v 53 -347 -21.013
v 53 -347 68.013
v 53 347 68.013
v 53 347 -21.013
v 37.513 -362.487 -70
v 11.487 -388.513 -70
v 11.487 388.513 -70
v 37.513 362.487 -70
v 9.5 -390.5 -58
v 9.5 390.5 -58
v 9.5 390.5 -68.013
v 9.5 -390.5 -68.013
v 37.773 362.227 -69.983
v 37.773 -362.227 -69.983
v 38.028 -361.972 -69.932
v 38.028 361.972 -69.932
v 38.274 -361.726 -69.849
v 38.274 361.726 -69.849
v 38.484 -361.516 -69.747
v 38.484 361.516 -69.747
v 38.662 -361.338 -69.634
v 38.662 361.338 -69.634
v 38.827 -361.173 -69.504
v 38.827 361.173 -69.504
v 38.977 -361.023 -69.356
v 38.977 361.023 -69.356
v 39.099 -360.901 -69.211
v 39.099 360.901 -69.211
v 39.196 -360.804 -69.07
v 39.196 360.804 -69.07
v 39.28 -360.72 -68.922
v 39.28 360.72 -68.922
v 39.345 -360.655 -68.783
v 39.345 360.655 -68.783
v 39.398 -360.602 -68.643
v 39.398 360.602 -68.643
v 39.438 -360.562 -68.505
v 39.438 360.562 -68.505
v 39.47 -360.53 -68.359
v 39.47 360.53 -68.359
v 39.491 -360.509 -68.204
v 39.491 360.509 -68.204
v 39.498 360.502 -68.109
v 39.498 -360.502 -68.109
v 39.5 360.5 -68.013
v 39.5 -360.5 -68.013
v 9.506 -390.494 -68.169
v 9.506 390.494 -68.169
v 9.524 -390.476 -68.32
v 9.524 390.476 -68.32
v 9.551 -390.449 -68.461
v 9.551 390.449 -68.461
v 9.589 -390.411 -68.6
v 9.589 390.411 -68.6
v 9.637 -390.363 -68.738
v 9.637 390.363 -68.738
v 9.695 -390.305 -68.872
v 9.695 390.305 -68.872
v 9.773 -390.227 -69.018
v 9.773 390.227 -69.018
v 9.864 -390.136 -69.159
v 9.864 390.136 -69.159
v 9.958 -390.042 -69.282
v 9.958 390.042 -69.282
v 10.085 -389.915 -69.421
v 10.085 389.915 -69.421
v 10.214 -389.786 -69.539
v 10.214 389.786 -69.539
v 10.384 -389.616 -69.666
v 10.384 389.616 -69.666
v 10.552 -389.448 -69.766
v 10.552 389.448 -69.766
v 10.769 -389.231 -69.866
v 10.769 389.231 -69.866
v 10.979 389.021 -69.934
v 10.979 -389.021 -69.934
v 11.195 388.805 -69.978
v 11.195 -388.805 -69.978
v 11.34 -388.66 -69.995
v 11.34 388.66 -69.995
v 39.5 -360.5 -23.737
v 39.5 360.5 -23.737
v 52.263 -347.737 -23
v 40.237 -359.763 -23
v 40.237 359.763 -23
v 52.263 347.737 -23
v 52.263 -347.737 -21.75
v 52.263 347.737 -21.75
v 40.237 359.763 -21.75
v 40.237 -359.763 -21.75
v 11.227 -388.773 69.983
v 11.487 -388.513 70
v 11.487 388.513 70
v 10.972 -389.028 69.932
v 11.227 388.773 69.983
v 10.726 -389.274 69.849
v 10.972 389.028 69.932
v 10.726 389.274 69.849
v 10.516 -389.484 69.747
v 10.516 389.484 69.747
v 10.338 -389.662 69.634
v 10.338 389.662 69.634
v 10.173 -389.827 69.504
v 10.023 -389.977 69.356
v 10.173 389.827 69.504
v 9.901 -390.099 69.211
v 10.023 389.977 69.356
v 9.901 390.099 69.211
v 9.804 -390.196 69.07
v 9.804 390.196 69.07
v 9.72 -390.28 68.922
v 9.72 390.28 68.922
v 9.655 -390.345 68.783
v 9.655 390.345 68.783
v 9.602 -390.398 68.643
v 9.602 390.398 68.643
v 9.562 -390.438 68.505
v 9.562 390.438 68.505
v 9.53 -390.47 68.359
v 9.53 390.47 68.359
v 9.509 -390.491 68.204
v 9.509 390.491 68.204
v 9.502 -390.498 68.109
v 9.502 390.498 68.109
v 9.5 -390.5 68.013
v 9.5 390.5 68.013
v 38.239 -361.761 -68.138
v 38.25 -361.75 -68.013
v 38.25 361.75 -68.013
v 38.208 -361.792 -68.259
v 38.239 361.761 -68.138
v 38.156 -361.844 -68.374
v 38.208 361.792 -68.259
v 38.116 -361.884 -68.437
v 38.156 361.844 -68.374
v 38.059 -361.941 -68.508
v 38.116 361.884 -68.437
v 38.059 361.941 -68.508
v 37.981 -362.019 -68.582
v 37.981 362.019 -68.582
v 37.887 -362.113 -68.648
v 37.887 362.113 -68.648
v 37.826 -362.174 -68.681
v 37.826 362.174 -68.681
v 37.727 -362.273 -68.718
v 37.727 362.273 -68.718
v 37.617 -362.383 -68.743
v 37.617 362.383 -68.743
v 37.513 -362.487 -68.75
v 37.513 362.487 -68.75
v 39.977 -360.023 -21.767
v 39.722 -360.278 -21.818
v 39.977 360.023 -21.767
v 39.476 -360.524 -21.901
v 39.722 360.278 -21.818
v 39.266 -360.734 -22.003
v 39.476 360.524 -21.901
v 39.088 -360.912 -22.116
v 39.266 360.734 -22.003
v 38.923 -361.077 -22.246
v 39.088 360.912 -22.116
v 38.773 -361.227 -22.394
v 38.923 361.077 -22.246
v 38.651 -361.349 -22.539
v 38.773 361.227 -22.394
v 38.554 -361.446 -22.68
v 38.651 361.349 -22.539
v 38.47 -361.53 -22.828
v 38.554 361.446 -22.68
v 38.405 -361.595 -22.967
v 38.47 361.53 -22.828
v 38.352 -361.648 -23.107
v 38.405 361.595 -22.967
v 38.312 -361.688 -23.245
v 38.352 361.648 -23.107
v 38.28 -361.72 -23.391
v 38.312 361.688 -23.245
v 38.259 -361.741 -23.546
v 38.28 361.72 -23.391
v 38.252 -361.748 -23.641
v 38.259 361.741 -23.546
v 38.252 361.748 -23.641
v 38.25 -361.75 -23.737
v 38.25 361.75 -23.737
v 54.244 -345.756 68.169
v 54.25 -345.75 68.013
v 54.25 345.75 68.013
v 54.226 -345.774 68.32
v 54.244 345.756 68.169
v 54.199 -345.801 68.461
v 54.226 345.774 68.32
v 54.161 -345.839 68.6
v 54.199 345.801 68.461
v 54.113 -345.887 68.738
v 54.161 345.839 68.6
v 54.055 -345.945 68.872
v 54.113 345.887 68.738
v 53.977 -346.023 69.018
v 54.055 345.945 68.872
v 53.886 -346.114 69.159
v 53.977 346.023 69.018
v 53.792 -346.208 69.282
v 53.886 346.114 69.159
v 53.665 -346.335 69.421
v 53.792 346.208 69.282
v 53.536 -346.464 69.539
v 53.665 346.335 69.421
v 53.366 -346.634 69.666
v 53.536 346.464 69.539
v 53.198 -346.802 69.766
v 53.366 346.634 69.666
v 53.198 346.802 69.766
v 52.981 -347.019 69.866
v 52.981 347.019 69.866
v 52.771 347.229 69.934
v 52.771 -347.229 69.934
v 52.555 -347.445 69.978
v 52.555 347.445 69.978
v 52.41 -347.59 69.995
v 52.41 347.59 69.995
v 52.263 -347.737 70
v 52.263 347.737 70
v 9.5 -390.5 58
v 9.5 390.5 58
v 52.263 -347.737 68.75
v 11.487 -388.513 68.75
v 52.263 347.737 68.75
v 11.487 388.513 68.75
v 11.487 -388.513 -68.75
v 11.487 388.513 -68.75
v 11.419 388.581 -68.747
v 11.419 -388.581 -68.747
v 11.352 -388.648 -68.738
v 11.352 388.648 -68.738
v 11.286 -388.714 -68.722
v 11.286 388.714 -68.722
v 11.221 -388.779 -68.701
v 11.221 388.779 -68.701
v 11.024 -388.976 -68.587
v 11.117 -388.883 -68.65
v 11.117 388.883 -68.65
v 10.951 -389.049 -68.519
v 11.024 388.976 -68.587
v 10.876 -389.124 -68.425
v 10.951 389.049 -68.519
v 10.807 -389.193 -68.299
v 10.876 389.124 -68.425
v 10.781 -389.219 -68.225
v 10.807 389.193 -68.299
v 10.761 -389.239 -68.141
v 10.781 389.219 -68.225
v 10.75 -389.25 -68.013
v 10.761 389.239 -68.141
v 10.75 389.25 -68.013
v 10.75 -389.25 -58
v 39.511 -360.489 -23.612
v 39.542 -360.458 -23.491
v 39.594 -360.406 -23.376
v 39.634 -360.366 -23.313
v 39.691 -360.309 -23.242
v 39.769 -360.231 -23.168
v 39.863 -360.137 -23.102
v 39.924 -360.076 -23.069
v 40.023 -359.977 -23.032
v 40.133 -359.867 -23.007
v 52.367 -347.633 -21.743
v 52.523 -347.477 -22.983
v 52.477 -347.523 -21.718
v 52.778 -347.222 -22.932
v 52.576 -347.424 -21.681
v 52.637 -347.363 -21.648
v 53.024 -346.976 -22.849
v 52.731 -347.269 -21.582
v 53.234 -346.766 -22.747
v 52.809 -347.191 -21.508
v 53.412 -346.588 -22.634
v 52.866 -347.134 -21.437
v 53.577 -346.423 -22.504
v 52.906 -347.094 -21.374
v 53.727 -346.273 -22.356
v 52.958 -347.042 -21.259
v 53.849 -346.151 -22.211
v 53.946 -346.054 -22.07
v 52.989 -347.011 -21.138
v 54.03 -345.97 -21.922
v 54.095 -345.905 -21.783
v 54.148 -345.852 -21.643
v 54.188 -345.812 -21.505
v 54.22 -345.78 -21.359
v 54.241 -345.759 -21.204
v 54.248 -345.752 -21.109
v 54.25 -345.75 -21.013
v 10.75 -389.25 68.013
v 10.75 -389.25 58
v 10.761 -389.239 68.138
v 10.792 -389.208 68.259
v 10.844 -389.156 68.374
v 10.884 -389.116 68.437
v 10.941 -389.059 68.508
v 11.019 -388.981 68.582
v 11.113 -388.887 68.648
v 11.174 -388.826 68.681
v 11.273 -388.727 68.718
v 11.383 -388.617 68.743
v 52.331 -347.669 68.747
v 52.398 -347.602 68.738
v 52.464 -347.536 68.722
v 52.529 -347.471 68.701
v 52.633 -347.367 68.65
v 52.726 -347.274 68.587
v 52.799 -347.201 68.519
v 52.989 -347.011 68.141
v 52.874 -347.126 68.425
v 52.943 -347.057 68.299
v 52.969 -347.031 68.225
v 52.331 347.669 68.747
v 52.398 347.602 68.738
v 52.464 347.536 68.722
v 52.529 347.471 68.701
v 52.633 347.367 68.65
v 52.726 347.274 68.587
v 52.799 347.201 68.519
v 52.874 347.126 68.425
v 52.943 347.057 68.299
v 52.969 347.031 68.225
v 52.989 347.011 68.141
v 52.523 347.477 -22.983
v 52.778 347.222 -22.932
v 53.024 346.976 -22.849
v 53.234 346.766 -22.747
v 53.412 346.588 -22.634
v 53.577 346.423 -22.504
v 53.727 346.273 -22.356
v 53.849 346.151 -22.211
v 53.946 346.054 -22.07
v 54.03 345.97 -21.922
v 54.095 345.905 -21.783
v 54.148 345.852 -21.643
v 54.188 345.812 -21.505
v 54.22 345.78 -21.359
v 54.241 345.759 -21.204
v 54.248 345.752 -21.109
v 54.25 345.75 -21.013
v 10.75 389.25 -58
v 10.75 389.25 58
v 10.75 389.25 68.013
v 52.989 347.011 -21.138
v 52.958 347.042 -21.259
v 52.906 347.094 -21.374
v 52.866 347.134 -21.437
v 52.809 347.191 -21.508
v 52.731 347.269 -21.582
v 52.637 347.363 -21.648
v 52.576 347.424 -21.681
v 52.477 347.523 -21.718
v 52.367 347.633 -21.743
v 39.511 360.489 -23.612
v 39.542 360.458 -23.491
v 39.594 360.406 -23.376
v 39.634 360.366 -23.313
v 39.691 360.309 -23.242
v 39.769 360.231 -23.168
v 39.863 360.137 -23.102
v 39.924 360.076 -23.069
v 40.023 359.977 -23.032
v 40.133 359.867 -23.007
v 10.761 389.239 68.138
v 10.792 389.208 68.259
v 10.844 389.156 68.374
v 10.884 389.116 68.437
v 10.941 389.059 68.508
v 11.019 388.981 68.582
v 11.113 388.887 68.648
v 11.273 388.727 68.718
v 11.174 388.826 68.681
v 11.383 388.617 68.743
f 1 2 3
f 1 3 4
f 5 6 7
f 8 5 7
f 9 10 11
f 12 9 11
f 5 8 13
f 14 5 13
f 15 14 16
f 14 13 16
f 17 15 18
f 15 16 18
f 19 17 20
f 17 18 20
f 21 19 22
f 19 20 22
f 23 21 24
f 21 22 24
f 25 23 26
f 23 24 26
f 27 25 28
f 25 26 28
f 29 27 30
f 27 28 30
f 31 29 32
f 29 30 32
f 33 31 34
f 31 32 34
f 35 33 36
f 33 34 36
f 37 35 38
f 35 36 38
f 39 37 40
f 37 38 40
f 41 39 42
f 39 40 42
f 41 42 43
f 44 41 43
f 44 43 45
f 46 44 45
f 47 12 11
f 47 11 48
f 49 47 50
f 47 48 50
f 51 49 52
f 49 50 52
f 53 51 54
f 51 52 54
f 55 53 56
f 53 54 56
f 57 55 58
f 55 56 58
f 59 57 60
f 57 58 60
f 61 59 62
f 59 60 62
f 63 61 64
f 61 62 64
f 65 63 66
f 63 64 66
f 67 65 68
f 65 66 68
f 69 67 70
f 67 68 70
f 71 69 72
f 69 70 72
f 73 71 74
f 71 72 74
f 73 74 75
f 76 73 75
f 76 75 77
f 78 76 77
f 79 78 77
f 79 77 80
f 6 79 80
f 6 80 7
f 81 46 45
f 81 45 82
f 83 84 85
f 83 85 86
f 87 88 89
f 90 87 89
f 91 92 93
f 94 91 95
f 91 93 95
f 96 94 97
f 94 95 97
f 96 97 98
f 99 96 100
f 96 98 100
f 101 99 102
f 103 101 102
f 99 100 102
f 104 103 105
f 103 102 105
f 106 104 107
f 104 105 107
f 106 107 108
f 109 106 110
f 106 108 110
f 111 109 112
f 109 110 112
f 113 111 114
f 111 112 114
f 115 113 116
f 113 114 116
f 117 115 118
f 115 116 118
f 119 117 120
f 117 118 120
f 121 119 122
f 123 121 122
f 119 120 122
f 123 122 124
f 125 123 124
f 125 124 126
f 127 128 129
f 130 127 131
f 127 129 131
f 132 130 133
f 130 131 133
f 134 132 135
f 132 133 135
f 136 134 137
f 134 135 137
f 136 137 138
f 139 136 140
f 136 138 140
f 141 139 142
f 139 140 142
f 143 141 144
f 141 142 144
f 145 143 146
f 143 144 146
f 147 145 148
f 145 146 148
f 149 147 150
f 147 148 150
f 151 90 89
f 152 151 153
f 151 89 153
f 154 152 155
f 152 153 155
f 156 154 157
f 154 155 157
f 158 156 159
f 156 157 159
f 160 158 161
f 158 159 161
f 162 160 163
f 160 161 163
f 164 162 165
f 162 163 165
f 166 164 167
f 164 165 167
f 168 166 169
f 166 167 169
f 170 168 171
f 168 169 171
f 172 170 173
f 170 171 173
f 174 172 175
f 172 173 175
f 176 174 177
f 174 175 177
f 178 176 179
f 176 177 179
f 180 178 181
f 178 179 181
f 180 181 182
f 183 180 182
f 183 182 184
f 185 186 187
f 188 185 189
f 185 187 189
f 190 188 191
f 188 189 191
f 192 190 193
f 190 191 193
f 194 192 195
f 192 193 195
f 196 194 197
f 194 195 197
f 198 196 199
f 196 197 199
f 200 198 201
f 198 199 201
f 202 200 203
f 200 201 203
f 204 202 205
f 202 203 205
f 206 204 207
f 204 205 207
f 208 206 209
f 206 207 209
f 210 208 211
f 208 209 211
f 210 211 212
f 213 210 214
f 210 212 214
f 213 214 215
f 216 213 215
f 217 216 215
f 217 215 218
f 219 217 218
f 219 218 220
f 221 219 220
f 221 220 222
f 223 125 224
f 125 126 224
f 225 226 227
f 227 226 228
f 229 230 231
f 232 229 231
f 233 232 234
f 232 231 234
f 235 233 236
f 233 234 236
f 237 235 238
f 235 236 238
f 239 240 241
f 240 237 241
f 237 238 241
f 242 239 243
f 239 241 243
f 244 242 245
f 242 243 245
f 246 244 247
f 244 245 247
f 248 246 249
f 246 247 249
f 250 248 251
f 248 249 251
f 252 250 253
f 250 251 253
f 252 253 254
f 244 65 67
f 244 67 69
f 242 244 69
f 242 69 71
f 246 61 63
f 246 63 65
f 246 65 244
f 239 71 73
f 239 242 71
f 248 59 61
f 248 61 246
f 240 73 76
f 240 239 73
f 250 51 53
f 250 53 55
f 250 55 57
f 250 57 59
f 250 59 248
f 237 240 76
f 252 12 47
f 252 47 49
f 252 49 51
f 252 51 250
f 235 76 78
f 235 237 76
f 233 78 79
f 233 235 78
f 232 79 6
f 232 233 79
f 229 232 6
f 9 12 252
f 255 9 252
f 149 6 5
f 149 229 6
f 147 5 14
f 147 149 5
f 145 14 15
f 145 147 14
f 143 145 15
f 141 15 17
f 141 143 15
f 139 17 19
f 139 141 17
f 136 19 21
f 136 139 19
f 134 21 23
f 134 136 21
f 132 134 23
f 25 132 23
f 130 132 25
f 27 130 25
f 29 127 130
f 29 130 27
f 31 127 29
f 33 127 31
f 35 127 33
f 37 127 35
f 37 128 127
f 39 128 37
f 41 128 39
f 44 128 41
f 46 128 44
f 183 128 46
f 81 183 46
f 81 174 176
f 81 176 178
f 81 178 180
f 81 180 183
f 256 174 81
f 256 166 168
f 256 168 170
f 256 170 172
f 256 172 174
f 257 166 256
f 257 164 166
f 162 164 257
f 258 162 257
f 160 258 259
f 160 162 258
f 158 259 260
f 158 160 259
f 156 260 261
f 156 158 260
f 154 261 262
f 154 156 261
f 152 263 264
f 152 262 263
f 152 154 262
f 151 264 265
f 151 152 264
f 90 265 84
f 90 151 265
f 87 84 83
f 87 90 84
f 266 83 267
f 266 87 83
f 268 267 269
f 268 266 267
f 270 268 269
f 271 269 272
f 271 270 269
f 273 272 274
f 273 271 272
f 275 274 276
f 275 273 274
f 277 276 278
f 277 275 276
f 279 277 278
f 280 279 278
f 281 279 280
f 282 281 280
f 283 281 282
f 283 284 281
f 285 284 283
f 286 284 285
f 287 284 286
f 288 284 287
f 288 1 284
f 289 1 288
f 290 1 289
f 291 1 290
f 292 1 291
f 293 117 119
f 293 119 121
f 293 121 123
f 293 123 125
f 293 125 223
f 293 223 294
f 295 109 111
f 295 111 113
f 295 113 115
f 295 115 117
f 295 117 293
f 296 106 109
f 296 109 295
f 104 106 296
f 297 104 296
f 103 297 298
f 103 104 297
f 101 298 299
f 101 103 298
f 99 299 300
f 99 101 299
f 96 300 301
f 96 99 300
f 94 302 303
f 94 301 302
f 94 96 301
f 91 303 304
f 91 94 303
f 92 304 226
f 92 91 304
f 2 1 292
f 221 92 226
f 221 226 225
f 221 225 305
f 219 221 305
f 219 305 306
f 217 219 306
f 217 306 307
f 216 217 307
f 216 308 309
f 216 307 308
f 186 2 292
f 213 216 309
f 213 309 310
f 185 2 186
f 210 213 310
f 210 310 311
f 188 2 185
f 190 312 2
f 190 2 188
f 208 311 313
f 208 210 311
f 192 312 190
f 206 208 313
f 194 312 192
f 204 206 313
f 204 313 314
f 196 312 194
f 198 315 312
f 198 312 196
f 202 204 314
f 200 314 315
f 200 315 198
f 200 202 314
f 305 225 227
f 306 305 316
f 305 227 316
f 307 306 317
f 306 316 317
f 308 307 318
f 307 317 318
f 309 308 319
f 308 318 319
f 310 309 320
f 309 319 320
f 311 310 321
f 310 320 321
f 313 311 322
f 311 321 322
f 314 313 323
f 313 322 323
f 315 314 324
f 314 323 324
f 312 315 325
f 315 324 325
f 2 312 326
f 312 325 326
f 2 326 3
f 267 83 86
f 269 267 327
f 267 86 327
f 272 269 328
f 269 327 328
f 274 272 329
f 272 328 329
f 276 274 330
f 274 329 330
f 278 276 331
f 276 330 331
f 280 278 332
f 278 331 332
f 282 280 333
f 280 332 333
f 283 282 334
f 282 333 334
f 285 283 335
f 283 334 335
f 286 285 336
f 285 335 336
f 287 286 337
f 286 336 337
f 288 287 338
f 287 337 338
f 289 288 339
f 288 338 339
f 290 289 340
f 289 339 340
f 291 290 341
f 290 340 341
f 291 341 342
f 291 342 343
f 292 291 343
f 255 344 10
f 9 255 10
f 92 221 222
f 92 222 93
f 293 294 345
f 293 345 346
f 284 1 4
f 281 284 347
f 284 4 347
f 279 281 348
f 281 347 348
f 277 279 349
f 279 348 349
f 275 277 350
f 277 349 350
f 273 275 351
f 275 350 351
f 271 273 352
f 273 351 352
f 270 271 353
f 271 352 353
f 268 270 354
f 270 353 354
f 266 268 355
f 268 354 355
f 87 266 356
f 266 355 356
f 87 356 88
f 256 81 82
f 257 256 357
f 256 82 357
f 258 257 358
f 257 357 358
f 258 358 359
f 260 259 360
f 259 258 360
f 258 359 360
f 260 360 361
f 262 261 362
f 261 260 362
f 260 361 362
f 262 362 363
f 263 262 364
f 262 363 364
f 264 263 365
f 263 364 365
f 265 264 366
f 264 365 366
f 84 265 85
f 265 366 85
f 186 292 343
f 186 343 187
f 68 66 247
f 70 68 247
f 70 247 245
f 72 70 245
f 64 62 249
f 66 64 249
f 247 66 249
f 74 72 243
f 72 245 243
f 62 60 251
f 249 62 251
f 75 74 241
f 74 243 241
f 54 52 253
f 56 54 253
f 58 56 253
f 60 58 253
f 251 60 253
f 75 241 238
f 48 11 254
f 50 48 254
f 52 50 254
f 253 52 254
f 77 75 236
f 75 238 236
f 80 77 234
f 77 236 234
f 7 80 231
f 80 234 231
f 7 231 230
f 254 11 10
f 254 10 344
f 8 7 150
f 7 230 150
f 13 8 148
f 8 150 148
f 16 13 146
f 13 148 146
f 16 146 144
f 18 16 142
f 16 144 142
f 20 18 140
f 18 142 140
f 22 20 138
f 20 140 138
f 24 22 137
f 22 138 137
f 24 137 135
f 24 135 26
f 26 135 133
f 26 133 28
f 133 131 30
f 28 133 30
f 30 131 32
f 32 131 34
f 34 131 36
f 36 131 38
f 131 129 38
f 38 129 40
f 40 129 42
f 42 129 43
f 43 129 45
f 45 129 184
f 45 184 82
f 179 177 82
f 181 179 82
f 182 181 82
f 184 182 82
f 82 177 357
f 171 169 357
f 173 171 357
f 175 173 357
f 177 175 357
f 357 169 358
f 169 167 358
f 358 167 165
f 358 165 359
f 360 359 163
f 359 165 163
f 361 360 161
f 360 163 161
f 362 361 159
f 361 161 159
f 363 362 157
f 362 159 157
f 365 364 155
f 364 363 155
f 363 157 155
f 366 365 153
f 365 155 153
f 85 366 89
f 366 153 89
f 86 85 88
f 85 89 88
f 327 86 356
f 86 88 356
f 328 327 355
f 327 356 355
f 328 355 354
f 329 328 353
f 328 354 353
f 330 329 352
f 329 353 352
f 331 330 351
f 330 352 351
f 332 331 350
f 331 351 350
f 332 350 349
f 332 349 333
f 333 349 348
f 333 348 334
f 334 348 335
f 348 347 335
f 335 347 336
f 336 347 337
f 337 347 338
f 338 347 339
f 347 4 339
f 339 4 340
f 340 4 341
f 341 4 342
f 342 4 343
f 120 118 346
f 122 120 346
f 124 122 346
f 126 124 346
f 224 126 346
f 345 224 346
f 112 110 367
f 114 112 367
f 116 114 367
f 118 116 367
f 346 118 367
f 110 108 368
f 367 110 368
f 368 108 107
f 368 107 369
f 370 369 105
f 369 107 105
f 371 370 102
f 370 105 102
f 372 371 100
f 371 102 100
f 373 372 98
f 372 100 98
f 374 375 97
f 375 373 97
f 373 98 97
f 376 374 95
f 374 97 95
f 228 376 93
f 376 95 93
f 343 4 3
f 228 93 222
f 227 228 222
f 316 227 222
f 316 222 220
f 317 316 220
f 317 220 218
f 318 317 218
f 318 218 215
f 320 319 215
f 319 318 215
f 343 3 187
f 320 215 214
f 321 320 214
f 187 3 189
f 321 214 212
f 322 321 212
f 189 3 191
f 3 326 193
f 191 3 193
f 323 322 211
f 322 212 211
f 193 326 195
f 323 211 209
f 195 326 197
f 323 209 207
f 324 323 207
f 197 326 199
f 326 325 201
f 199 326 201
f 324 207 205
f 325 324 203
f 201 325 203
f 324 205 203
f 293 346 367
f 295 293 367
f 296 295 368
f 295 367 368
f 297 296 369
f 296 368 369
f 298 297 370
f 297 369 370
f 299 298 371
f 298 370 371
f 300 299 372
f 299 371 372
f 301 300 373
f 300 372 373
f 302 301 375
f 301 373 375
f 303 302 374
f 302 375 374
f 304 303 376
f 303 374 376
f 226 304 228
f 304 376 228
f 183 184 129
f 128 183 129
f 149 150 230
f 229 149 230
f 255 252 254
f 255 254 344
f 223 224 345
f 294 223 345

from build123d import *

# Parameters (mm, degrees)
BASE_FLANGE1_DEPTH = 390.5
CUT_EXTRUDE2_DEPTH = 419.369827425


# Sheet-metal steps are written as plain solids
with BuildPart() as part:
    # Sketch1 → Base-Flange1 (new, symmetric)
    with BuildSketch(Plane(origin=(0, 0, 0), x_dir=(1, 0, 0), z_dir=(0, 1, 0))):
        with BuildLine():
            Line((9.5, 58), (9.5, 68.0134))
            ThreePointArc((9.5, 68.0134), (10.081861668, 69.418138332), (11.4866, 70))
            Line((11.4866, 70), (37.5134, 70))
            ThreePointArc((37.5134, 70), (38.918138332, 69.418138332), (39.5, 68.0134))
            Line((39.5, 68.0134), (39.5, 23.7366))
            ThreePointArc((39.5, 23.7366), (39.715745145, 23.215745145), (40.2366, 23))
            Line((40.2366, 23), (52.2634, 23))
            ThreePointArc((52.2634, 23), (53.668138332, 22.418138332), (54.25, 21.0134))
            Line((54.25, 21.0134), (54.25, 18))
            Line((54.25, 18), (54.25, -23))
            Line((54.25, -23), (54.25, -68.0134))
            ThreePointArc((54.25, -68.0134), (53.668138332, -69.418138332), (52.2634, -70))
            Line((52.2634, -70), (39.5, -70))
            Line((39.5, -70), (11.4866, -70))
            ThreePointArc((11.4866, -70), (10.081861668, -69.418138332), (9.5, -68.0134))
            Line((9.5, -68.0134), (9.5, -58))
            Line((9.5, -58), (10.75, -58))
            Line((10.75, -58), (10.75, -68.0134))
            ThreePointArc((10.75, -68.0134), (10.965745145, -68.534254855), (11.4866, -68.75))
            Line((11.4866, -68.75), (39.5, -68.75))
            Line((39.5, -68.75), (52.2634, -68.75))
            ThreePointArc((52.2634, -68.75), (52.784254855, -68.534254855), (53, -68.0134))
            Line((53, -68.0134), (53, -23))
            Line((53, -23), (53, 18))
            Line((53, 18), (53, 21.0134))
            ThreePointArc((53, 21.0134), (52.784254855, 21.534254855), (52.2634, 21.75))
            Line((52.2634, 21.75), (40.2366, 21.75))
            ThreePointArc((40.2366, 21.75), (38.831861668, 22.331861668), (38.25, 23.7366))
            Line((38.25, 23.7366), (38.25, 68.0134))
            ThreePointArc((38.25, 68.0134), (38.034254855, 68.534254855), (37.5134, 68.75))
            Line((37.5134, 68.75), (11.4866, 68.75))
            ThreePointArc((11.4866, 68.75), (10.965745145, 68.534254855), (10.75, 68.0134))
            Line((10.75, 68.0134), (10.75, 58))
            Line((10.75, 58), (9.5, 58))
        make_face()
    extrude(amount=BASE_FLANGE1_DEPTH, both=True)

    # Sketch2 → Cut-Extrude2 (cut, through all)
    with BuildSketch(Plane.XY.offset(70)):
        Polygon((9.5, -390.5), (204.29871247, -195.70128753), (123.087268974, -390.5), align=None)
        Polygon((123.087268974, 390.5), (9.5, 390.5), (204.29871247, 195.70128753), align=None)
    extrude(amount=-CUT_EXTRUDE2_DEPTH, mode=Mode.SUBTRACT)


solid = part.part
